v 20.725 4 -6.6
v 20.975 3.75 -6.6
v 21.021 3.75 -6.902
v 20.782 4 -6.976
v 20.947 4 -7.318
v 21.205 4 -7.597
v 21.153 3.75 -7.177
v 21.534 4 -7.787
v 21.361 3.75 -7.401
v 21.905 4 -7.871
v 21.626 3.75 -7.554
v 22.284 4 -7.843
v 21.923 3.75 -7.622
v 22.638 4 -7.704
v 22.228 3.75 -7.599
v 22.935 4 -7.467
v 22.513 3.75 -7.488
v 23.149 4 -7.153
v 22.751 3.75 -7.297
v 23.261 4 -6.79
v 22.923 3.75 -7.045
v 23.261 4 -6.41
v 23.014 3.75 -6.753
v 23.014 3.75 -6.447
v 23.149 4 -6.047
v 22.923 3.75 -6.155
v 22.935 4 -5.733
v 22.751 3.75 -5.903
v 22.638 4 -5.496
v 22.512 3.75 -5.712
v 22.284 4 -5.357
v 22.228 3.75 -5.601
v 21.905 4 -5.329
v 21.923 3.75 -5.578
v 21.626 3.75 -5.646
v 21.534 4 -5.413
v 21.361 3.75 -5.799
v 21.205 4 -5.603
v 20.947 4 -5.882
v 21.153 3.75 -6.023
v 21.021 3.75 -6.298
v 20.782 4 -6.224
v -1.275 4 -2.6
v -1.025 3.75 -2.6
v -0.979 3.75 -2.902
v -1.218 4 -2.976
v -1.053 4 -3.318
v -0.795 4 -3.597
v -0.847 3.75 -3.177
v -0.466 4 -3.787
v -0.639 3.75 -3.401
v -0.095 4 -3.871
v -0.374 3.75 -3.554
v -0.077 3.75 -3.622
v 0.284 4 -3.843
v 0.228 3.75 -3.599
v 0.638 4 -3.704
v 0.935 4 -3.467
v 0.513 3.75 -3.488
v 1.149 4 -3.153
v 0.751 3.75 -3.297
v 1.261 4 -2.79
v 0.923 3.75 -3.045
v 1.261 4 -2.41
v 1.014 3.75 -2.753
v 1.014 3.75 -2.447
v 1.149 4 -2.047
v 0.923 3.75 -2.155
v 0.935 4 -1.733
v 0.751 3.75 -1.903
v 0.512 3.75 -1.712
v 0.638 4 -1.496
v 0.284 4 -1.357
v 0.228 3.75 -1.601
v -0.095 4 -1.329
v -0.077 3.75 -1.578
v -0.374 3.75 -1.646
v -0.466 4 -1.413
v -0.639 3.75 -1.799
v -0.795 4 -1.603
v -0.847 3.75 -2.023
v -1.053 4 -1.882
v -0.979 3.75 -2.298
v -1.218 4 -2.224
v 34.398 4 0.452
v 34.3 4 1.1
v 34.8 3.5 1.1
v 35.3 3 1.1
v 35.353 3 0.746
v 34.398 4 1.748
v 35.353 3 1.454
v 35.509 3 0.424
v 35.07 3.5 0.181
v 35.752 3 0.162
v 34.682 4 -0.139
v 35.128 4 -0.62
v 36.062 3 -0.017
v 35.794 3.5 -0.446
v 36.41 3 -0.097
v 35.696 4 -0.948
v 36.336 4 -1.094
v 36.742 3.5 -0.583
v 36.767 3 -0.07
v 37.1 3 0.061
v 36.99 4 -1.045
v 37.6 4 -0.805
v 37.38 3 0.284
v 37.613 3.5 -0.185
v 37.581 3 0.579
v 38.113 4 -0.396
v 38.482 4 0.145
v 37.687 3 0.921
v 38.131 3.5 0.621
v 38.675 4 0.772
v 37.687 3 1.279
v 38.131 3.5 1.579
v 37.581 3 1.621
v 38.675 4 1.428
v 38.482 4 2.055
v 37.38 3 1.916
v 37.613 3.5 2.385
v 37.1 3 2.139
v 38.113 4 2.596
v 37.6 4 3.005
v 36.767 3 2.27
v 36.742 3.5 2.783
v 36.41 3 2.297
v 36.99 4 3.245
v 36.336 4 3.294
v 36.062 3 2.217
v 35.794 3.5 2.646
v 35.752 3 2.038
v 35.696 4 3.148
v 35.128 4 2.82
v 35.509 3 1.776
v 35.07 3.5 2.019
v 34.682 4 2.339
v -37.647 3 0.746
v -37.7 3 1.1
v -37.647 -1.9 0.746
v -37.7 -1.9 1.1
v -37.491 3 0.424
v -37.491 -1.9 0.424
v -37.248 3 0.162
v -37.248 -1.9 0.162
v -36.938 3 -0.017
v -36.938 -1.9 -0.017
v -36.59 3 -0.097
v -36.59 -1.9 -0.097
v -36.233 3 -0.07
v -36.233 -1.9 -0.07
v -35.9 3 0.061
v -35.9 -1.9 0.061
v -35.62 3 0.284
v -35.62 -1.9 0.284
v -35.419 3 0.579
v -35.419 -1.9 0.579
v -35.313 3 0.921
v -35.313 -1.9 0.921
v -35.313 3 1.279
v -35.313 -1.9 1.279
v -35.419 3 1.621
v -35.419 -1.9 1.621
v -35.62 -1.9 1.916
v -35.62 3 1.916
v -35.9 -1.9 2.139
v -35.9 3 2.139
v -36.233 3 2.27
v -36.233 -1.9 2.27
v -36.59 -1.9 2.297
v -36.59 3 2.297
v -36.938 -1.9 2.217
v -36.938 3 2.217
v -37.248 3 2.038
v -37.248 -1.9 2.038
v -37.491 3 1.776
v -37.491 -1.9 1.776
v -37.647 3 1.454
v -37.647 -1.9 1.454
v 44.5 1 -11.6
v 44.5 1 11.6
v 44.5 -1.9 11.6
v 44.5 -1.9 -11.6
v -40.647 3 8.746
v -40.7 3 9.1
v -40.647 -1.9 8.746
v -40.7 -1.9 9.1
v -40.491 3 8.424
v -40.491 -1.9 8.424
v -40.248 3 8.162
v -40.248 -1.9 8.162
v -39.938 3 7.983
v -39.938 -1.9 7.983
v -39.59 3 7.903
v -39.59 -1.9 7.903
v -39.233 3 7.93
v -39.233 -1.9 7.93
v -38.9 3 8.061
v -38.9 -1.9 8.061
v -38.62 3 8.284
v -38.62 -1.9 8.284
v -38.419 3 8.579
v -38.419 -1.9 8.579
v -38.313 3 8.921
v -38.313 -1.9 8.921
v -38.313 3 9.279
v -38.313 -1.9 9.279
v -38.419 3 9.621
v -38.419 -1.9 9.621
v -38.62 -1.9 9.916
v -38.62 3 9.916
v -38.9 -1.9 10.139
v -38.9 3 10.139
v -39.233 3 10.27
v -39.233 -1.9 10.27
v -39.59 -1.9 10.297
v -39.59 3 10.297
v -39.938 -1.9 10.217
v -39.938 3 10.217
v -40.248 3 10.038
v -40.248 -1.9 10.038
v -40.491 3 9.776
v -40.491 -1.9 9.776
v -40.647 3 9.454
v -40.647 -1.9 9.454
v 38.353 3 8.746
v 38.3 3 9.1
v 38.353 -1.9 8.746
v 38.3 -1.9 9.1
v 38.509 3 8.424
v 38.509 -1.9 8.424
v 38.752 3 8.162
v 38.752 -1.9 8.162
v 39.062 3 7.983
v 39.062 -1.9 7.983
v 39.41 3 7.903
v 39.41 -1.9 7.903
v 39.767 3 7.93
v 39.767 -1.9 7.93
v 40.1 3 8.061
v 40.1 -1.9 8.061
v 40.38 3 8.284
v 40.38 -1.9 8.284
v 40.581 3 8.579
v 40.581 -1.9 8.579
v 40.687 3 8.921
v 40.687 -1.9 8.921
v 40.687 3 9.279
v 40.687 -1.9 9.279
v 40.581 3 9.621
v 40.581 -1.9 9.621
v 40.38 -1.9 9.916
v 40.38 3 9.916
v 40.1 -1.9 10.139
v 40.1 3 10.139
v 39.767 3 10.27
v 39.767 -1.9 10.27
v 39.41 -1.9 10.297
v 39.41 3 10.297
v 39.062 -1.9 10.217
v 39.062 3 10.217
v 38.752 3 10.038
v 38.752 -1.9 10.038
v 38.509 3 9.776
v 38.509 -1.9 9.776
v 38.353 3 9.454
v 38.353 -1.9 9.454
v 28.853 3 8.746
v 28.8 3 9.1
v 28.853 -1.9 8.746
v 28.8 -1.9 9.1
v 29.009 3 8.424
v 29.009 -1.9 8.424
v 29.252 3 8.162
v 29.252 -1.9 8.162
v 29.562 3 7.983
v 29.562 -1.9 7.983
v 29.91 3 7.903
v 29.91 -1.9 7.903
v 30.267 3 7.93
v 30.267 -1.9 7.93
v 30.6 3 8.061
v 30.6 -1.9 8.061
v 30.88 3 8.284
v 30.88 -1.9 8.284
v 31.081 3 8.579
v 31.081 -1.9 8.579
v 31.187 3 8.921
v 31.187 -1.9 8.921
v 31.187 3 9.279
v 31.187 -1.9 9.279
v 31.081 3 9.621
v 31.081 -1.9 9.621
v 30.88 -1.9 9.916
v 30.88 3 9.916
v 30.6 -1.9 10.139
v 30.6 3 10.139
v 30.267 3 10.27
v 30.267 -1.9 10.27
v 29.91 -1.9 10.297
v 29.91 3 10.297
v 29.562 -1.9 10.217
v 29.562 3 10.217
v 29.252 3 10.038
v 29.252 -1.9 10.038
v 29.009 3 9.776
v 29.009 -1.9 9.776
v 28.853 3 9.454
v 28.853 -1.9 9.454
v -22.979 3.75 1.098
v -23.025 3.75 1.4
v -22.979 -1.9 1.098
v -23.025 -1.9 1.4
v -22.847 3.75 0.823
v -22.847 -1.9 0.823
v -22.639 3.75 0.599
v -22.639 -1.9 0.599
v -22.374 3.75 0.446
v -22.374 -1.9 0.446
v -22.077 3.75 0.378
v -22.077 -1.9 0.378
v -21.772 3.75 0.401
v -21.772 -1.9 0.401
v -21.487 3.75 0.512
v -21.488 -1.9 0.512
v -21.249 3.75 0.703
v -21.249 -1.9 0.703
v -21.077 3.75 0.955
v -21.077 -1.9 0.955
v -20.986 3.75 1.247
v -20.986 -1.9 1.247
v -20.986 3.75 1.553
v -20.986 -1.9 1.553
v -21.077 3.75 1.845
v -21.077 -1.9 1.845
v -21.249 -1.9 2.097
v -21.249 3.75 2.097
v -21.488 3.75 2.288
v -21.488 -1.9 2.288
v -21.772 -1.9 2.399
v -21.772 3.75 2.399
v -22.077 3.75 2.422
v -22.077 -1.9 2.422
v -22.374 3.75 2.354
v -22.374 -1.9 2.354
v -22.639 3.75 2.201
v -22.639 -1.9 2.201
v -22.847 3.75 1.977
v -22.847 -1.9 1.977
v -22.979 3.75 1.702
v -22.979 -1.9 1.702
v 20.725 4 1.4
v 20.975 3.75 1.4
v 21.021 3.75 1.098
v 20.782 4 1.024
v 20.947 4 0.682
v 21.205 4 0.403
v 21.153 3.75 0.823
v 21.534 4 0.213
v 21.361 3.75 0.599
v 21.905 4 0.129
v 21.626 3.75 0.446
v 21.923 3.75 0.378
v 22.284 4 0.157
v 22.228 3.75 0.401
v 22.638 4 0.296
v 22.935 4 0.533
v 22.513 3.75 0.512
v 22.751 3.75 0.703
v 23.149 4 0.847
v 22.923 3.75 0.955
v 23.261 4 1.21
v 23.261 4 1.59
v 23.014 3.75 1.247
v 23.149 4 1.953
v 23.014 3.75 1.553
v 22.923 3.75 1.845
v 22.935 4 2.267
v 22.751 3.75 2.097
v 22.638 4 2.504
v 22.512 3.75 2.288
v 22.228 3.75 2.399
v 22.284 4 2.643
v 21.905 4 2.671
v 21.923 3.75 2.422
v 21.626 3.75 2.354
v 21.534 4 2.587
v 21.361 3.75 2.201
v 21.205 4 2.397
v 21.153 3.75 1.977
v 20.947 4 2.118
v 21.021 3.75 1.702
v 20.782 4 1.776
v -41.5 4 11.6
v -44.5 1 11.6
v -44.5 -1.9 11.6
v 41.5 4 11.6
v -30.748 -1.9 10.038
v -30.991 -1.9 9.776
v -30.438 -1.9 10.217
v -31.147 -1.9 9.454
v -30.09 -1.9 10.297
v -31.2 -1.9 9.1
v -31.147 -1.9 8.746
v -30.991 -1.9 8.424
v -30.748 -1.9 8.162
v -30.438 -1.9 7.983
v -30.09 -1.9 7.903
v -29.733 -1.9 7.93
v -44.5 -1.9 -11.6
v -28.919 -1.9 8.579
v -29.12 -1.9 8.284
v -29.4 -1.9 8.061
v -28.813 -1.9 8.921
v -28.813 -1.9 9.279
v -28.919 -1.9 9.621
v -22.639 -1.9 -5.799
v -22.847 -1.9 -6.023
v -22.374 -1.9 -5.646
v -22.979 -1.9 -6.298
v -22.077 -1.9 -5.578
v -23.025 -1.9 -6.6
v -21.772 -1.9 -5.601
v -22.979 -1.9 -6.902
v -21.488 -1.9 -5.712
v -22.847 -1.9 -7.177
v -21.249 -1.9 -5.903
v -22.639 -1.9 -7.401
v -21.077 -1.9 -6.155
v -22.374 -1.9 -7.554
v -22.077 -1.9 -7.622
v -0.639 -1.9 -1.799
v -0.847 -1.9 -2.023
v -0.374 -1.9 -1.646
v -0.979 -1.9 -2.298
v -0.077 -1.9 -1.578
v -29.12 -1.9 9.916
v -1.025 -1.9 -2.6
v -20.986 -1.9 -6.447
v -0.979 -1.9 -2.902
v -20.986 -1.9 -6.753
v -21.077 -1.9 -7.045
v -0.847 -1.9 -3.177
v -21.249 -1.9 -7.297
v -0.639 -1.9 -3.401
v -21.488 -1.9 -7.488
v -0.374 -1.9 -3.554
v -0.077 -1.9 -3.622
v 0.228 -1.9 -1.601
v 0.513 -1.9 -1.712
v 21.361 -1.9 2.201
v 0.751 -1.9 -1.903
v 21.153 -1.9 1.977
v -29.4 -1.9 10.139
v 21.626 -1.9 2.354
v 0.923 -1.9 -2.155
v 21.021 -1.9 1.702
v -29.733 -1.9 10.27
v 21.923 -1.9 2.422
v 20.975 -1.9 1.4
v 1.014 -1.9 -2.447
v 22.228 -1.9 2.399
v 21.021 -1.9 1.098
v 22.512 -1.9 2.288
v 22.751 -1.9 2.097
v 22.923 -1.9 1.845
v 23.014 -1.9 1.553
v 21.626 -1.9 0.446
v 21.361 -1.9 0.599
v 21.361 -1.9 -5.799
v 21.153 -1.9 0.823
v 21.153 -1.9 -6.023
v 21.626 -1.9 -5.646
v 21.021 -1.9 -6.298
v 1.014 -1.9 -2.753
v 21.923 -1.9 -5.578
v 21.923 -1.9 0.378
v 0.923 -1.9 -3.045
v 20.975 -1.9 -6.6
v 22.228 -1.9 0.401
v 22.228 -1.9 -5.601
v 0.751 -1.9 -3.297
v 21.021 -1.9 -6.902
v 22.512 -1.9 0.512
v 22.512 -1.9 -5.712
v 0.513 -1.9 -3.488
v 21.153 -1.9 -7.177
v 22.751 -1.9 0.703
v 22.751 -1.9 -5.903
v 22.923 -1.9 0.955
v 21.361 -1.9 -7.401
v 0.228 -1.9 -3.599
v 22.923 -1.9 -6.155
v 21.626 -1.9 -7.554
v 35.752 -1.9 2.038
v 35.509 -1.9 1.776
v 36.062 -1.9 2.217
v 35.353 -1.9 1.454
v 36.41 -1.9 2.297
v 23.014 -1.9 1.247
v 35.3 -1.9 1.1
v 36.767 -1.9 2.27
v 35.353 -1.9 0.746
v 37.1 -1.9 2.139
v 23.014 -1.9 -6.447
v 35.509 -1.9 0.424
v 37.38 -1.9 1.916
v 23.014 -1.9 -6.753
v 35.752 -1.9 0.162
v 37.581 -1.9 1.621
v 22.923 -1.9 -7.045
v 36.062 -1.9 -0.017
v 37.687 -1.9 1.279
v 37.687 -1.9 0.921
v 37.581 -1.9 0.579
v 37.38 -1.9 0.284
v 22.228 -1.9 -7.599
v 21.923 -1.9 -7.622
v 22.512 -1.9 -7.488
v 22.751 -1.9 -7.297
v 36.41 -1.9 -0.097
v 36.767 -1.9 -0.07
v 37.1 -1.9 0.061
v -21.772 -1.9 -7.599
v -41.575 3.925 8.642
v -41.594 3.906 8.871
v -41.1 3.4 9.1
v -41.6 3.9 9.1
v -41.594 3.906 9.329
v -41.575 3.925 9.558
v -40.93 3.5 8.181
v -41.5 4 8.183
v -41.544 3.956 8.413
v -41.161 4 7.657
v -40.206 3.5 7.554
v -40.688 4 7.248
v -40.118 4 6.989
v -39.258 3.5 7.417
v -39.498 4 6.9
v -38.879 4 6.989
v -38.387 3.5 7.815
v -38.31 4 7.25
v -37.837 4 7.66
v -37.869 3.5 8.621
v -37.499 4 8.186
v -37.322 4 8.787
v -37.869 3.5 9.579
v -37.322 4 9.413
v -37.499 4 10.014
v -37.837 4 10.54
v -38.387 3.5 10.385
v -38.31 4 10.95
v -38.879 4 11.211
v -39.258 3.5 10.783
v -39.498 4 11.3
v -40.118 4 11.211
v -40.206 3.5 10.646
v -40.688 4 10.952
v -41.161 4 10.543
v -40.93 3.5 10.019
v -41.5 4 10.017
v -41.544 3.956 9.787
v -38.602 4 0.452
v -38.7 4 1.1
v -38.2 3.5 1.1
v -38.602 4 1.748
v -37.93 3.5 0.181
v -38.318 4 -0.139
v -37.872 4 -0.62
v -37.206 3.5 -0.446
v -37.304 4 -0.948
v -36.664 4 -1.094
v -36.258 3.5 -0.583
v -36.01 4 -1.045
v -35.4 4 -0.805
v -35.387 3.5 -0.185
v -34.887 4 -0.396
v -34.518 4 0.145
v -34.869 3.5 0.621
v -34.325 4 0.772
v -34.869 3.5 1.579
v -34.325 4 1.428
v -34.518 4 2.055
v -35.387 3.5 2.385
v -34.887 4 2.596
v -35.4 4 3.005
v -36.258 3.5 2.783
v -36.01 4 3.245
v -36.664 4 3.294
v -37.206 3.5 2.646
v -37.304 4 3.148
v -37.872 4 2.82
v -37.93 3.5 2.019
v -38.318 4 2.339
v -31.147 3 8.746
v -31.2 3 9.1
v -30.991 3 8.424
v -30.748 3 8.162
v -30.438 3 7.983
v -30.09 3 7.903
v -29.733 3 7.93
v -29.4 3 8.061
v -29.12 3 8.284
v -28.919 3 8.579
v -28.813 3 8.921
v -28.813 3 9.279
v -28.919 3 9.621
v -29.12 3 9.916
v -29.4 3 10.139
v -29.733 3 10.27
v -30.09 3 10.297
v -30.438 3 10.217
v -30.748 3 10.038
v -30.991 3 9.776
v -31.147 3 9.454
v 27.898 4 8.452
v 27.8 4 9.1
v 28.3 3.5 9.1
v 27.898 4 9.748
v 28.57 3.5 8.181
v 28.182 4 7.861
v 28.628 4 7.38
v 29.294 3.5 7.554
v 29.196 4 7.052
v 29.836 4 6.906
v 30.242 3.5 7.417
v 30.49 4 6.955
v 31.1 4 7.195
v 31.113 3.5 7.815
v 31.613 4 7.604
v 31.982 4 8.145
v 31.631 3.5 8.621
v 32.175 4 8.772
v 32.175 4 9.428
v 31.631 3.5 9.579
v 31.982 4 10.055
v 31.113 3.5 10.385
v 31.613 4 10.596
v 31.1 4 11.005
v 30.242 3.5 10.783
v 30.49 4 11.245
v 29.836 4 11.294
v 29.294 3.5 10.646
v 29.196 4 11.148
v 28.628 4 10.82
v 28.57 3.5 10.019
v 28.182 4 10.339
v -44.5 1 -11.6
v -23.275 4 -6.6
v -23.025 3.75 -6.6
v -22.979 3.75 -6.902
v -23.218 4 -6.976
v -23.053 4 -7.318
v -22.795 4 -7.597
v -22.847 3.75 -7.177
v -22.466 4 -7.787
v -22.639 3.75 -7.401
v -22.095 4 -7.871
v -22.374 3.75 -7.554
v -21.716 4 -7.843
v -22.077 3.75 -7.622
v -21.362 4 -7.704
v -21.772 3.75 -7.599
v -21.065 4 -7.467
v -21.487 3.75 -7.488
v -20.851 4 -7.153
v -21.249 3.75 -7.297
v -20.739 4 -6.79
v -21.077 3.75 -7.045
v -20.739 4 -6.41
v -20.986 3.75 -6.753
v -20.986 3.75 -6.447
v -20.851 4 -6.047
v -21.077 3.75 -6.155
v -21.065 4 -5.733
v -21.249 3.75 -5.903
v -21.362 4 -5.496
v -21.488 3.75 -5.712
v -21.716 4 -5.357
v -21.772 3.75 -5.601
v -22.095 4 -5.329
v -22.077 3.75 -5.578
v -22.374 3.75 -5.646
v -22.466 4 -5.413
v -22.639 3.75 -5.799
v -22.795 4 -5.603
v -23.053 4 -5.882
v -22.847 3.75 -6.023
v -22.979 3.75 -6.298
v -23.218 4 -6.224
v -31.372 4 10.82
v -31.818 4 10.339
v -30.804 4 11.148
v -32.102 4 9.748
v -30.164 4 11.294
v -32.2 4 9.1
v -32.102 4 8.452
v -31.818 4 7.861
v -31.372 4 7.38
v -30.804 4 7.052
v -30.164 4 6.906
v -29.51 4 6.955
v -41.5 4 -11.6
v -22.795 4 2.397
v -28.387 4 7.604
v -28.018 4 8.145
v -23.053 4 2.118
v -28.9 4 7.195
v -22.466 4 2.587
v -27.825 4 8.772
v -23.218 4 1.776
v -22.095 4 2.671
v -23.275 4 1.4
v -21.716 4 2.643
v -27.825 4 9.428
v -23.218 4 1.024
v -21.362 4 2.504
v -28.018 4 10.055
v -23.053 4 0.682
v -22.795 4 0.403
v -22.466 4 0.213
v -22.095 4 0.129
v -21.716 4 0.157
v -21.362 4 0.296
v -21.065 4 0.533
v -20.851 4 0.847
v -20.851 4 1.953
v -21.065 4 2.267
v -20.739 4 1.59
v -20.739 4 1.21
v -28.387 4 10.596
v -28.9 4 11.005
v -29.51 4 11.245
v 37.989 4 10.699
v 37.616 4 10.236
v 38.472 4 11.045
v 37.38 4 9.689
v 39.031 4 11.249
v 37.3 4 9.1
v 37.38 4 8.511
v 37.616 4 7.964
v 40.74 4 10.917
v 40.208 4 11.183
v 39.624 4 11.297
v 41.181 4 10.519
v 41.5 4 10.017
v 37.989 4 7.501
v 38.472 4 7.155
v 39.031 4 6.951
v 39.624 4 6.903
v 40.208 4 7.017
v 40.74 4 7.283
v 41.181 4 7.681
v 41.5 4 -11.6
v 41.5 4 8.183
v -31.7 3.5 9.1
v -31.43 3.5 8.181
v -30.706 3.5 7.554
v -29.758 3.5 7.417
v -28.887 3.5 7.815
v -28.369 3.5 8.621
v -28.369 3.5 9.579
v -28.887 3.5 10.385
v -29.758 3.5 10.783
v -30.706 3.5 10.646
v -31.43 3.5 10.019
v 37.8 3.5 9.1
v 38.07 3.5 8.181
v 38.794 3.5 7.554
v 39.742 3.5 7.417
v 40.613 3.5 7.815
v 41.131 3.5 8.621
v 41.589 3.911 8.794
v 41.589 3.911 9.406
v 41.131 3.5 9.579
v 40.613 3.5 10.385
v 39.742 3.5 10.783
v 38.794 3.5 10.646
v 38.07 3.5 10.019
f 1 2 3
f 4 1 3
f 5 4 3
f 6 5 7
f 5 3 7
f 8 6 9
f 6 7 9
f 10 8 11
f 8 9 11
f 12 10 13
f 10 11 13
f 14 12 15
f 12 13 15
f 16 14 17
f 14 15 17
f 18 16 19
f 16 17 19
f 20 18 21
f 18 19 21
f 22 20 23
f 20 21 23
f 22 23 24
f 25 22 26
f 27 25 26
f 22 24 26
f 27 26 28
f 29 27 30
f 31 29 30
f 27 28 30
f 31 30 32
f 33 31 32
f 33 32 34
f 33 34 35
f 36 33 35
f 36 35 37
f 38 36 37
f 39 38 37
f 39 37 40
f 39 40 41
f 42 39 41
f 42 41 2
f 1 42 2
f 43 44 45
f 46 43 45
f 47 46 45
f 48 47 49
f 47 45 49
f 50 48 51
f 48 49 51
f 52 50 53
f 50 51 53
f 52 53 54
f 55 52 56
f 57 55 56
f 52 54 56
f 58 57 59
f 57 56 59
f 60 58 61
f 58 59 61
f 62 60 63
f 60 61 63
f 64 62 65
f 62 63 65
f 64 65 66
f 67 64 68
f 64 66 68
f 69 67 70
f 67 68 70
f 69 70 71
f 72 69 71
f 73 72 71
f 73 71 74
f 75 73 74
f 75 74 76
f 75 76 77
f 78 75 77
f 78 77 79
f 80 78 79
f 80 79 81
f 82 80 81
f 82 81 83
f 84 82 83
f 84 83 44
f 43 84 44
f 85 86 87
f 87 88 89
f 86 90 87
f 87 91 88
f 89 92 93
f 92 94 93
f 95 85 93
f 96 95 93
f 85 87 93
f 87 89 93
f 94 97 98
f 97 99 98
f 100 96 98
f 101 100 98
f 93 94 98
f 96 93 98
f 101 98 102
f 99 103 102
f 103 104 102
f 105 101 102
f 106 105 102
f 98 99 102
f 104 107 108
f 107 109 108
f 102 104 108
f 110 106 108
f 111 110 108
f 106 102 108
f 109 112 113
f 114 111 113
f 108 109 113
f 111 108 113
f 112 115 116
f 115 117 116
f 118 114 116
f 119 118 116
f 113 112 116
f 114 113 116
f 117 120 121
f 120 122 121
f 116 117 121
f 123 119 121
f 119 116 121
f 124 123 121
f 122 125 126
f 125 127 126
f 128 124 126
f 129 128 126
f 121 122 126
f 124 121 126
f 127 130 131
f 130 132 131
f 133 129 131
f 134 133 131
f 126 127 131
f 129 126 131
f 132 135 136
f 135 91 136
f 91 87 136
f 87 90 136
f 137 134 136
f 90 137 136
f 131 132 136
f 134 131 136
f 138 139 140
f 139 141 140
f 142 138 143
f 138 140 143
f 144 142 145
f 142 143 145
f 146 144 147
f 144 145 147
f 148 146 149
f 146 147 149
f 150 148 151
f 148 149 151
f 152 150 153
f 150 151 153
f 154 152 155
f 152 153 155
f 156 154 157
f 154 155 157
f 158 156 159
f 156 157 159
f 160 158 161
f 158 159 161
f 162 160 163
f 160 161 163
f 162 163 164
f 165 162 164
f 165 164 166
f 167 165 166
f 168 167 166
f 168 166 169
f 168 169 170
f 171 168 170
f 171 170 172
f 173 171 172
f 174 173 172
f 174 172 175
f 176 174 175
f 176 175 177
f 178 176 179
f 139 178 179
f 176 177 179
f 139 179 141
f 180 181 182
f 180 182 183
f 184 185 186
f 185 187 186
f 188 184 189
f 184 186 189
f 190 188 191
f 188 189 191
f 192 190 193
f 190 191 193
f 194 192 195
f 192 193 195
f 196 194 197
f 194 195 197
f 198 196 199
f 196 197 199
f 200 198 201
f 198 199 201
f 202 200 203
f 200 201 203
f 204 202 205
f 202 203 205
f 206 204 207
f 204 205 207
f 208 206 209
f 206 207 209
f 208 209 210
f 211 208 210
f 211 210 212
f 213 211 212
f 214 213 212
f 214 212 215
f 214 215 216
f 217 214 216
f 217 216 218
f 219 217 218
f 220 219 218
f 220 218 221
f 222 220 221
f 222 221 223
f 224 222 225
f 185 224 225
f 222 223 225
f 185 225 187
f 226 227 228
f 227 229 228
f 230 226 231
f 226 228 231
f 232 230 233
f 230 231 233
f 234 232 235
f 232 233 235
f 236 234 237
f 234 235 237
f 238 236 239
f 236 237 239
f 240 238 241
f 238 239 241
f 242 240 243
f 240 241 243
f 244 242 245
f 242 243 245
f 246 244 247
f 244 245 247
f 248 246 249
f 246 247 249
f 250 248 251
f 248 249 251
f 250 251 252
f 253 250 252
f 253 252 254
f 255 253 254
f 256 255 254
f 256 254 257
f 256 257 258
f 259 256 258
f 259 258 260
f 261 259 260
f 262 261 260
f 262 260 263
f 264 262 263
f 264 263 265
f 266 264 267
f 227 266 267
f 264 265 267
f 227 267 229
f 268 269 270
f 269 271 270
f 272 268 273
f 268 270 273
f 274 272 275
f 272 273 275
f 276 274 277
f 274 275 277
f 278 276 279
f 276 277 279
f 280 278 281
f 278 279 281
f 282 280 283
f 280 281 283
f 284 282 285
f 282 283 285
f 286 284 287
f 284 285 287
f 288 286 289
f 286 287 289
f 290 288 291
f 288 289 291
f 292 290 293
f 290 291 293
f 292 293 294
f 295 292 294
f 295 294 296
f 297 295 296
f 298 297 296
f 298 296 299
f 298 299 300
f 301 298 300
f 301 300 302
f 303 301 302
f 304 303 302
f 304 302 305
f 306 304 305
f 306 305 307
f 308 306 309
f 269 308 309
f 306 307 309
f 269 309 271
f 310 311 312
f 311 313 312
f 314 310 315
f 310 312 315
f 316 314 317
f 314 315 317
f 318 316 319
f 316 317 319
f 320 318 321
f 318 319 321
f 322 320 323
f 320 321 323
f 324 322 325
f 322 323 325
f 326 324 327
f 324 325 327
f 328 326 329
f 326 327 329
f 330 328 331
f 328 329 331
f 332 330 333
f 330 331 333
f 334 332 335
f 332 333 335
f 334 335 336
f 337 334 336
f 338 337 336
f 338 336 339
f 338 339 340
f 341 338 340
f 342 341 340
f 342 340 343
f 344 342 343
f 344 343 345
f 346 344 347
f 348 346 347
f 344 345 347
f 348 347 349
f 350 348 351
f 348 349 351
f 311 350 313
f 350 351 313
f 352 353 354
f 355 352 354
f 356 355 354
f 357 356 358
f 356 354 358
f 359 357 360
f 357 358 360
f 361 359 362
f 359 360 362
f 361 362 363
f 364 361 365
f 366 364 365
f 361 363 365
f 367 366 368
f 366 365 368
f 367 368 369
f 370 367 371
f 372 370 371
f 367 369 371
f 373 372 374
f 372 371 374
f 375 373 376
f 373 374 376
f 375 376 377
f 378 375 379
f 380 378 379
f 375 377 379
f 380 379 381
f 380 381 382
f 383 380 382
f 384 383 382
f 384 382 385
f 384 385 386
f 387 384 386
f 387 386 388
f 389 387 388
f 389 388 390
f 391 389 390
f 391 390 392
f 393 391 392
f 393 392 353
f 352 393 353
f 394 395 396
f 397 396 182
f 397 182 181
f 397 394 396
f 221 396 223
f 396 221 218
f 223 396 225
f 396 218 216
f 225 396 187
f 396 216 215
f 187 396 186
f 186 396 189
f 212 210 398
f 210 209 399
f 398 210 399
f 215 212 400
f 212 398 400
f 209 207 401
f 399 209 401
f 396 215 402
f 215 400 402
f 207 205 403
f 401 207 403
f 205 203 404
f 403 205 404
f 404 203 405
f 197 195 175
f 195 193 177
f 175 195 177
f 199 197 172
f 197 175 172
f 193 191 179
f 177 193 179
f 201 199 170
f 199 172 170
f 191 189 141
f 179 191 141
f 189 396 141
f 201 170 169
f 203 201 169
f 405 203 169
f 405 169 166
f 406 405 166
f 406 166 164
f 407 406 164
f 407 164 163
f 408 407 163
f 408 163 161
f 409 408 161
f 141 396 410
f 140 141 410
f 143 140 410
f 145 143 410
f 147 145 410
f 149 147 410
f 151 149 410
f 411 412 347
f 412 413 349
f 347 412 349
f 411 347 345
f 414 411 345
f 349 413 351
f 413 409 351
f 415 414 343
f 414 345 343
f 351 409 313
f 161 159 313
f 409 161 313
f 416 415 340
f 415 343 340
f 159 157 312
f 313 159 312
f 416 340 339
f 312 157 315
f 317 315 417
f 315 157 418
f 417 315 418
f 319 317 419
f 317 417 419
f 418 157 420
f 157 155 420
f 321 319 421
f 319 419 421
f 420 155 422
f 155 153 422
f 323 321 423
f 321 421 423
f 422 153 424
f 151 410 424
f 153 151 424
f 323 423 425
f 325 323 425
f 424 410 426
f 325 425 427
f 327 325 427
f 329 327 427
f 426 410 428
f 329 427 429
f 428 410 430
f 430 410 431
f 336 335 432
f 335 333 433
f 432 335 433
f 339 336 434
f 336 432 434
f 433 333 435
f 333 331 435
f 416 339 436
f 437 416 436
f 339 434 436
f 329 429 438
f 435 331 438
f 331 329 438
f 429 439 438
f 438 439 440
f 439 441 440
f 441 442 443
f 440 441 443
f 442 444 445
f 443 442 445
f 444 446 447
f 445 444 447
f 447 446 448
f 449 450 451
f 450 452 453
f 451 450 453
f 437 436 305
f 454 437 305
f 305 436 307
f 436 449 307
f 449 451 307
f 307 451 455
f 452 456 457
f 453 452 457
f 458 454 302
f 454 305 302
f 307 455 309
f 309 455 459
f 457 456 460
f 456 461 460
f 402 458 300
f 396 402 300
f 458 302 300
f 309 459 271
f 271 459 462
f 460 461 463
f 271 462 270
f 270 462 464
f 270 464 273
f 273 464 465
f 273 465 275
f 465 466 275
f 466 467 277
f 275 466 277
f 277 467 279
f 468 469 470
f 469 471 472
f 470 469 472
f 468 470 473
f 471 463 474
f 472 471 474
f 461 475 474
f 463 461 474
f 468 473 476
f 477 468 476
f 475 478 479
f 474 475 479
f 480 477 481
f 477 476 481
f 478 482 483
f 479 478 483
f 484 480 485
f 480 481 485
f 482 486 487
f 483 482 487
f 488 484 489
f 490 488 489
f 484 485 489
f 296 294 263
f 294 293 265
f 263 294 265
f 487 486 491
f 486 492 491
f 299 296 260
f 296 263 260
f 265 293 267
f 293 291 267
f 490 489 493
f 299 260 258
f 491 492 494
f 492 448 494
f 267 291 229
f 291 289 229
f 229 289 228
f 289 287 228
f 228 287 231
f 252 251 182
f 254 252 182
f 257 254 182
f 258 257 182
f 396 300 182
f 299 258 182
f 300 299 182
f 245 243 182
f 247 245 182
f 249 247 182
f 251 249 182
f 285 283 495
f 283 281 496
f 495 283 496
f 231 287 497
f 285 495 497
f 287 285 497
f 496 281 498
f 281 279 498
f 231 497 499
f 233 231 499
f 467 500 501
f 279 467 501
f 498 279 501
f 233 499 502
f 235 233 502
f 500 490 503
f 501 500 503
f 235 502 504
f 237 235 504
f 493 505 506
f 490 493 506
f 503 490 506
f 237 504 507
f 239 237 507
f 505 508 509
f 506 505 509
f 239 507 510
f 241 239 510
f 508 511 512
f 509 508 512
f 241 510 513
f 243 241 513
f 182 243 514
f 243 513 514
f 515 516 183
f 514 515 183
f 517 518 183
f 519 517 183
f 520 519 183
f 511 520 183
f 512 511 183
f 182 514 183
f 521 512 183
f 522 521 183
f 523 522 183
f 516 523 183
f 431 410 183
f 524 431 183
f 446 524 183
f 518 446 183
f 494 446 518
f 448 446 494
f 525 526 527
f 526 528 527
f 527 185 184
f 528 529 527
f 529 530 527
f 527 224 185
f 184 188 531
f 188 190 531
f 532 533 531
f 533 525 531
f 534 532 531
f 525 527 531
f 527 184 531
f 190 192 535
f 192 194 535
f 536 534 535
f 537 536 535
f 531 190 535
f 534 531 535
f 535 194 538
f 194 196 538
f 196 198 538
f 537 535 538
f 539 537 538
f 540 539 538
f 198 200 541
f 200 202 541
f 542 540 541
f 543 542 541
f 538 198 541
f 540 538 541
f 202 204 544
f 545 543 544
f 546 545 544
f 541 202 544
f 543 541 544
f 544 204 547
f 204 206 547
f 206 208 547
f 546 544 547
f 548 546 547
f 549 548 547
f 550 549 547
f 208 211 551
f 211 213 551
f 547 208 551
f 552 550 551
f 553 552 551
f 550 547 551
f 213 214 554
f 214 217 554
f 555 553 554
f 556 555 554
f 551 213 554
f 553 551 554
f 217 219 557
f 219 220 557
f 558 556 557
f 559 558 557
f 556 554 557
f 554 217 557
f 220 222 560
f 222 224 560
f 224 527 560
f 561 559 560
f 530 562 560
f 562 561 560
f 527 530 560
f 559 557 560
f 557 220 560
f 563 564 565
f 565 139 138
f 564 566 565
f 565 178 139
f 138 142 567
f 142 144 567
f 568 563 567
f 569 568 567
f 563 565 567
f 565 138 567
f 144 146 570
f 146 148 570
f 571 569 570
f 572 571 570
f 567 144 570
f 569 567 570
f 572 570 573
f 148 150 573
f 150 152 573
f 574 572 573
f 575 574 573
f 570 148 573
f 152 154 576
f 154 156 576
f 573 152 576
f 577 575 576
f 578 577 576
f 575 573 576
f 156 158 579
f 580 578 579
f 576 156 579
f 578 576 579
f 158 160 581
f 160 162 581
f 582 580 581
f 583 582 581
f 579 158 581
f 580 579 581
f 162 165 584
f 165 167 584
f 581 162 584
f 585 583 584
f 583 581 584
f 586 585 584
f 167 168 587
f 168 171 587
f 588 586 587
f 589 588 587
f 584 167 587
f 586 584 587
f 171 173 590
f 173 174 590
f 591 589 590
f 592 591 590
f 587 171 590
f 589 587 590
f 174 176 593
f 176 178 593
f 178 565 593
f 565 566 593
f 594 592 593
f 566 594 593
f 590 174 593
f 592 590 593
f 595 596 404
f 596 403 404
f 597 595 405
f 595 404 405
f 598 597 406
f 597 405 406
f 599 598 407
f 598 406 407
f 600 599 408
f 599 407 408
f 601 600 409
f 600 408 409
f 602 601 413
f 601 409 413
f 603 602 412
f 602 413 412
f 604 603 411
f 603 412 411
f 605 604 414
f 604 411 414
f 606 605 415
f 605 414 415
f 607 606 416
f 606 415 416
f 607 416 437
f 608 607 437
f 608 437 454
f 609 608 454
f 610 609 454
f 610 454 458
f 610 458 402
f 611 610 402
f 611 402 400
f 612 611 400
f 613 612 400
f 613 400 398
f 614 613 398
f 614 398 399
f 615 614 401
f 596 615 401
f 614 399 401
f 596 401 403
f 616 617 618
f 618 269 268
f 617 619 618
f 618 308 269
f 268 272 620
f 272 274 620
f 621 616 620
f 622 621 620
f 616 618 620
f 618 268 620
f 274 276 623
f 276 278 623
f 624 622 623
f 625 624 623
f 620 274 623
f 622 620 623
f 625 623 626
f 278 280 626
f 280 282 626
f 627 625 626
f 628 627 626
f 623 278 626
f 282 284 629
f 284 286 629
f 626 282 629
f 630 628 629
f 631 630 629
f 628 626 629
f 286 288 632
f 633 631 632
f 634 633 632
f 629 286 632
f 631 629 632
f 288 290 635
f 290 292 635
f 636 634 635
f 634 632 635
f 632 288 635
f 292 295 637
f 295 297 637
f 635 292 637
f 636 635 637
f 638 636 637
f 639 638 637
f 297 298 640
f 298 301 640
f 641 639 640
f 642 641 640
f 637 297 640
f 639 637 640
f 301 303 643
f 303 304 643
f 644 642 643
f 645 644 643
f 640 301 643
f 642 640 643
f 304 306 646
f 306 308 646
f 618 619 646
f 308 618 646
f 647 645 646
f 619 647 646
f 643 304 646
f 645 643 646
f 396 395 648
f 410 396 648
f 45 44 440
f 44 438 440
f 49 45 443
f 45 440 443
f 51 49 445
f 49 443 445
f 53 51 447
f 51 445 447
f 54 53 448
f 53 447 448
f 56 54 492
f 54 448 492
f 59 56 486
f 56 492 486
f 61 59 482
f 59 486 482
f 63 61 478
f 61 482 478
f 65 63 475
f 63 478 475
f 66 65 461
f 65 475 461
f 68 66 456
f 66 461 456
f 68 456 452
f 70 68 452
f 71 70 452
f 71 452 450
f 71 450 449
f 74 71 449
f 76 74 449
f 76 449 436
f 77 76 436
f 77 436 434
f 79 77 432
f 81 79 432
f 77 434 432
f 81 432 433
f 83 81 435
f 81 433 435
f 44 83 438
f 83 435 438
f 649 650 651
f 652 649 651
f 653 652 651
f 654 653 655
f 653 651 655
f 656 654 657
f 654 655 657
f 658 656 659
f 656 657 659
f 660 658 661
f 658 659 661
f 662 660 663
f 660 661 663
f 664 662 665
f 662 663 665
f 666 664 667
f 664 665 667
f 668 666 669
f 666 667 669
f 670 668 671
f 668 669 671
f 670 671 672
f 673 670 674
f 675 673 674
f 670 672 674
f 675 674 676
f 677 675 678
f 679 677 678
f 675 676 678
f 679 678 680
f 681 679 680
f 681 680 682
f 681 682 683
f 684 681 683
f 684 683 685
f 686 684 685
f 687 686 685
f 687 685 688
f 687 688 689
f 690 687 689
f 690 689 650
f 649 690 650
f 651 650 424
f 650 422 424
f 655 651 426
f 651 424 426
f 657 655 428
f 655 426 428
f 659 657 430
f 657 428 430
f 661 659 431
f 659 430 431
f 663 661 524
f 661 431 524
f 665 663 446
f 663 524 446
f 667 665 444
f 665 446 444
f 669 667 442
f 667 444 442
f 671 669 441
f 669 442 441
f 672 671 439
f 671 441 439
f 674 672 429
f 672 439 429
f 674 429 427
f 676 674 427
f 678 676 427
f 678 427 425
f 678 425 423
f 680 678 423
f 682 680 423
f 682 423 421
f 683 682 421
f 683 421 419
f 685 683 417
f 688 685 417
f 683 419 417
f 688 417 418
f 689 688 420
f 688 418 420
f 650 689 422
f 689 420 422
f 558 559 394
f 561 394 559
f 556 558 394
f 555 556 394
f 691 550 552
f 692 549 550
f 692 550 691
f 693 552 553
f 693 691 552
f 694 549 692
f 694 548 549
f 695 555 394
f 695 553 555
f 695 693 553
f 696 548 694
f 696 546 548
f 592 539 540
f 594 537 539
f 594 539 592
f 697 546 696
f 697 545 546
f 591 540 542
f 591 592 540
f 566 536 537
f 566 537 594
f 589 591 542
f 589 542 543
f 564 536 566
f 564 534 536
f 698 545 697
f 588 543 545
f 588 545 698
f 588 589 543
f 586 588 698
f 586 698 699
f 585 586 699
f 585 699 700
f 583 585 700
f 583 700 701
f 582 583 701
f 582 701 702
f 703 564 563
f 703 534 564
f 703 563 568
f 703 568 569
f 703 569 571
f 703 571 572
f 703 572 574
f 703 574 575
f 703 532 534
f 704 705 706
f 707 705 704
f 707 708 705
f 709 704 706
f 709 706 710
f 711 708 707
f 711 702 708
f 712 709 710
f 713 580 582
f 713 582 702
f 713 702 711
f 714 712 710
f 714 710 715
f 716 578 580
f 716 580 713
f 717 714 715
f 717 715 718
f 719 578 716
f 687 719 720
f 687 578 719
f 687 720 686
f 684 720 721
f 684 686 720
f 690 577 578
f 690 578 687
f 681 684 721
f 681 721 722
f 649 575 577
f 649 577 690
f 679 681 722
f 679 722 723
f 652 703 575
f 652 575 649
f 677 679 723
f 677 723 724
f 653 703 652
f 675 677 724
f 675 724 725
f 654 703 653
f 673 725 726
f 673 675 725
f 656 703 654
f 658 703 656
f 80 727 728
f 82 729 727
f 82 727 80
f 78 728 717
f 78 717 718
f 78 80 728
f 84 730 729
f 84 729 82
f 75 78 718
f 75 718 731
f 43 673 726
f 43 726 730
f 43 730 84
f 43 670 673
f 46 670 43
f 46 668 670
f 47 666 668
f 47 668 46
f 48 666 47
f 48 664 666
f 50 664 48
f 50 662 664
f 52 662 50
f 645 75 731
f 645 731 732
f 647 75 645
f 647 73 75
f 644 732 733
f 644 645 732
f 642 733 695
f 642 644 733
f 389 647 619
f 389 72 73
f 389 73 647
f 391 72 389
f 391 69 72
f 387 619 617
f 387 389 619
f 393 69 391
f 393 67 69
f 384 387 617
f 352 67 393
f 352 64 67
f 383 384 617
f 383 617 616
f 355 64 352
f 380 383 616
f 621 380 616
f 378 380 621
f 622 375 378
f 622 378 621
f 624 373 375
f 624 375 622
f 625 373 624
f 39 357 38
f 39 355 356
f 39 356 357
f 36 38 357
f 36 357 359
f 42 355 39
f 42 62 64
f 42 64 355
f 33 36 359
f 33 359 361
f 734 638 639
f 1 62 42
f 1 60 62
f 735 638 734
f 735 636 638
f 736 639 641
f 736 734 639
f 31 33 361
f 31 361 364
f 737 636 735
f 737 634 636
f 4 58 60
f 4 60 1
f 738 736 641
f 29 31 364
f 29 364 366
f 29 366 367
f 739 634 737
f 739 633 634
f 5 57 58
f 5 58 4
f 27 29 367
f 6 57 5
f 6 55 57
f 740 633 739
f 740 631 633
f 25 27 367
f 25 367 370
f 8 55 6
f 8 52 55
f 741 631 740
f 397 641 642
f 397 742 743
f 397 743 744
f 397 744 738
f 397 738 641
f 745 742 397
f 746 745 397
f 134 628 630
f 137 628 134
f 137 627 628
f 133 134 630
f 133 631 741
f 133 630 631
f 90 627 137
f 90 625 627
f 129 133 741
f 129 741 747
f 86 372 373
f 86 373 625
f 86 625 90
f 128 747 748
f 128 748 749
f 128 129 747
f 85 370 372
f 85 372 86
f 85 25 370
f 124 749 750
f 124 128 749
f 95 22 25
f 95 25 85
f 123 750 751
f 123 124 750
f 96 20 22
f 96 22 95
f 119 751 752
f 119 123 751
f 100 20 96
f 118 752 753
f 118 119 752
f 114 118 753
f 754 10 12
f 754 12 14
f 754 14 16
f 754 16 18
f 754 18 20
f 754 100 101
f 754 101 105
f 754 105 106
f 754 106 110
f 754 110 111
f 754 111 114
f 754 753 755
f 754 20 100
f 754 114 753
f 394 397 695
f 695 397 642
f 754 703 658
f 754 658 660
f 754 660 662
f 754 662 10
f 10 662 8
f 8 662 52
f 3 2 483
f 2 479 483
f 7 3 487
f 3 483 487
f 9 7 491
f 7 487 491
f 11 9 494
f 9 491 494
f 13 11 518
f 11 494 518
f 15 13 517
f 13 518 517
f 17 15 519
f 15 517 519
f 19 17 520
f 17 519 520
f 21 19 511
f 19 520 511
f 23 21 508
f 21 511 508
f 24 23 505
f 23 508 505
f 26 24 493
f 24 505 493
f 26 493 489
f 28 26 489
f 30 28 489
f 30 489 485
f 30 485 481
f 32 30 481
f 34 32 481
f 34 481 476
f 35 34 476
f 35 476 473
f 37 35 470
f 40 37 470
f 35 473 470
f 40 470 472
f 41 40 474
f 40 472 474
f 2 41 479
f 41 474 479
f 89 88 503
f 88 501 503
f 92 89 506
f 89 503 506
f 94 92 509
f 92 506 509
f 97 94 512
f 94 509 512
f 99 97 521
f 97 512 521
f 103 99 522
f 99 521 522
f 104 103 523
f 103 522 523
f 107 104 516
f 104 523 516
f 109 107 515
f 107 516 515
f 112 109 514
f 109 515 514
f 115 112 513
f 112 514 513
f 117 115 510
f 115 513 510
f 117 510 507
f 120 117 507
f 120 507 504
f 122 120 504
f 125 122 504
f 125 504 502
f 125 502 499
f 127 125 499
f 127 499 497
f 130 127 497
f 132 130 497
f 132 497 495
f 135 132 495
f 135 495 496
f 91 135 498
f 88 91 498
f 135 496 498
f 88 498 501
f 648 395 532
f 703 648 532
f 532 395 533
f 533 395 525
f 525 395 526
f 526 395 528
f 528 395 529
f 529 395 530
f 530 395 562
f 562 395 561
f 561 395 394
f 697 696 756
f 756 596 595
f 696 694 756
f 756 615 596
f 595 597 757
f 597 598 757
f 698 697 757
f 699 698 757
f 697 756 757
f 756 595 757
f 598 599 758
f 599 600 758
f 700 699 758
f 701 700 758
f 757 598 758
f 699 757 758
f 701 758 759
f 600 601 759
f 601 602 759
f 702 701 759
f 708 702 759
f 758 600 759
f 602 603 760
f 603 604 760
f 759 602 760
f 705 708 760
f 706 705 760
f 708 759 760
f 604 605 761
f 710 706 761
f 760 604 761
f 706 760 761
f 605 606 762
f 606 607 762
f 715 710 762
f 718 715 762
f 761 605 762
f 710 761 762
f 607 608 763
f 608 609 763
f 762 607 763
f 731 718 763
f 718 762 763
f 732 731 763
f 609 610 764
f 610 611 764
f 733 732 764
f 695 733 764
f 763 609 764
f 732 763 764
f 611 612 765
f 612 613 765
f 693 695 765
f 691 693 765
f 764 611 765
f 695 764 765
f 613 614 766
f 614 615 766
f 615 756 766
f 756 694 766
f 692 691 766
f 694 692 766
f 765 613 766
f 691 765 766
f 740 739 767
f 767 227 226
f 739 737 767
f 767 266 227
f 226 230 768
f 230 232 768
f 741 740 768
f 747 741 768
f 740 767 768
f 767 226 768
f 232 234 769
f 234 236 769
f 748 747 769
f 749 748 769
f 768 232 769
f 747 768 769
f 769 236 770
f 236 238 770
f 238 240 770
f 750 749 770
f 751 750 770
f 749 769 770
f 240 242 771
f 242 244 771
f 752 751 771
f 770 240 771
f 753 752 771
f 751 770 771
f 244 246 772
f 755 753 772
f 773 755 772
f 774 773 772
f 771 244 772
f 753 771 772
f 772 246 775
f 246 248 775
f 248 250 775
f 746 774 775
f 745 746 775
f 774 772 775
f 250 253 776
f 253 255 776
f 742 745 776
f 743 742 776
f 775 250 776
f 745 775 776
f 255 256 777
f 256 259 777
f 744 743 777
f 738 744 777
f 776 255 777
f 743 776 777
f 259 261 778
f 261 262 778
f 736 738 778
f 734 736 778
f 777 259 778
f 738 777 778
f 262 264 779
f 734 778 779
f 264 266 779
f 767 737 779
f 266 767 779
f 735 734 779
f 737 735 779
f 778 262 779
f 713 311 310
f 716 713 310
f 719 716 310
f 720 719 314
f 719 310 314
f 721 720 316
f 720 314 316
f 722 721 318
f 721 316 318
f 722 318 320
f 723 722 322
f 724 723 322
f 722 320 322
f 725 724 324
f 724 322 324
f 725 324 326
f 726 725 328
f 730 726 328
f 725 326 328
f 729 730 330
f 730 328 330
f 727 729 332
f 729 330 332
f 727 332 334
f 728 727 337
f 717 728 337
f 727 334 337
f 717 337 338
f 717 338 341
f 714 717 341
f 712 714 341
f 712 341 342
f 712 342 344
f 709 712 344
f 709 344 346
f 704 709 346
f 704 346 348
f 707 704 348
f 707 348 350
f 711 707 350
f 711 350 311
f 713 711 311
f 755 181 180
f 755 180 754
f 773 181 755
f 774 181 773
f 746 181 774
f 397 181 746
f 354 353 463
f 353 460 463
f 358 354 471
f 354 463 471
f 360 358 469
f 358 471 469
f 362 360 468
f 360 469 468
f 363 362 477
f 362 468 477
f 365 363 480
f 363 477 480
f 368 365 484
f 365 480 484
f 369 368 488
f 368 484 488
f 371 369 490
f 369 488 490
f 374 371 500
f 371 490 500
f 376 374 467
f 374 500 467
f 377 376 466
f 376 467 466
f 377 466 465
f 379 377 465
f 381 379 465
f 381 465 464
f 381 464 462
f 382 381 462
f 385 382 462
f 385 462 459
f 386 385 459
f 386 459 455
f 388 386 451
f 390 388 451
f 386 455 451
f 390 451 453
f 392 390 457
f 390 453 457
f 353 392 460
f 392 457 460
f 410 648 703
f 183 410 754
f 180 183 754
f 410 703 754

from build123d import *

# Parameters (mm, degrees)
SKETCH1_W                                       = 89
SKETCH1_H                                       = 23.2
BOSS_EXTRUDE1_DEPTH                             = 4
BOSS_EXTRUDE1_DEPTH_BACK                        = 1.9
M2_5X0_45_TAPPED_HOLE2_D                        = 2.05
M2_5X0_45_TAPPED_HOLE2_CSINK_D                  = 2.55
M2_5X0_45_TAPPED_HOLE2_CSINK_ANGLE              = 90
CSK_FOR_M2_FLAT_HEAD_MACHINE_SCREW1_D           = 2.4
CSK_FOR_M2_FLAT_HEAD_MACHINE_SCREW1_DEPTH       = 6.45
CSK_FOR_M2_FLAT_HEAD_MACHINE_SCREW1_CSINK_D     = 4.4
CSK_FOR_M2_FLAT_HEAD_MACHINE_SCREW1_CSINK_ANGLE = 90
CSK_FOR_M2_FLAT_HEAD_MACHINE_SCREW1_TIP         = 0.721032743
CUT_EXTRUDE1_DEPTH                              = 23.2


with BuildPart() as part:
    # Sketch1 → Boss-Extrude1 (new body, two sides)
    with BuildSketch(Plane(origin=(0, 0, 0), x_dir=(1, 0, 0), z_dir=(0, 1, 0))) as boss_extrude1_sk:
        Rectangle(SKETCH1_W, SKETCH1_H)
    extrude(amount=BOSS_EXTRUDE1_DEPTH)
    extrude(boss_extrude1_sk.sketch, amount=-BOSS_EXTRUDE1_DEPTH_BACK)

    # M2.5x0.45 Tapped Hole2 (through all)
    with Locations(Plane(origin=(0, 4, 0), x_dir=(1, 0, 0), z_dir=(0, 1, 0))):
        with Locations((-22, 6.6), (-22, -1.4), (22, -1.4), (22, 6.6), (0, 2.6)):
            CounterSinkHole(M2_5X0_45_TAPPED_HOLE2_D / 2, M2_5X0_45_TAPPED_HOLE2_CSINK_D / 2, counter_sink_angle=M2_5X0_45_TAPPED_HOLE2_CSINK_ANGLE)

    # CSK for M2 Flat Head Machine Screw1
    with Locations(Plane(origin=(0, 4, 0), x_dir=(1, 0, 0), z_dir=(0, 1, 0))):
        with Locations((-36.5, -1.1), (-39.5, -9.1), (-30, -9.1), (30, -9.1), (39.5, -9.1), (36.5, -1.1)):
            CounterSinkHole(CSK_FOR_M2_FLAT_HEAD_MACHINE_SCREW1_D / 2, CSK_FOR_M2_FLAT_HEAD_MACHINE_SCREW1_CSINK_D / 2, depth=CSK_FOR_M2_FLAT_HEAD_MACHINE_SCREW1_DEPTH, counter_sink_angle=CSK_FOR_M2_FLAT_HEAD_MACHINE_SCREW1_CSINK_ANGLE)
            with Locations((0, 0, -(CSK_FOR_M2_FLAT_HEAD_MACHINE_SCREW1_DEPTH + CSK_FOR_M2_FLAT_HEAD_MACHINE_SCREW1_TIP / 2))):  # 118° drill point
                Cone(0, CSK_FOR_M2_FLAT_HEAD_MACHINE_SCREW1_D / 2, CSK_FOR_M2_FLAT_HEAD_MACHINE_SCREW1_TIP, mode=Mode.SUBTRACT)

    # Sketch8 → Cut-Extrude1 (cut)
    with BuildSketch(Plane.XY.offset(11.6)):
        Polygon((41.5, 4), (44.5, 4), (44.5, 1), align=None)
        Polygon((-44.5, 4), (-44.5, 1), (-41.5, 4), align=None)
    extrude(amount=-CUT_EXTRUDE1_DEPTH, mode=Mode.SUBTRACT)


solid = part.part
